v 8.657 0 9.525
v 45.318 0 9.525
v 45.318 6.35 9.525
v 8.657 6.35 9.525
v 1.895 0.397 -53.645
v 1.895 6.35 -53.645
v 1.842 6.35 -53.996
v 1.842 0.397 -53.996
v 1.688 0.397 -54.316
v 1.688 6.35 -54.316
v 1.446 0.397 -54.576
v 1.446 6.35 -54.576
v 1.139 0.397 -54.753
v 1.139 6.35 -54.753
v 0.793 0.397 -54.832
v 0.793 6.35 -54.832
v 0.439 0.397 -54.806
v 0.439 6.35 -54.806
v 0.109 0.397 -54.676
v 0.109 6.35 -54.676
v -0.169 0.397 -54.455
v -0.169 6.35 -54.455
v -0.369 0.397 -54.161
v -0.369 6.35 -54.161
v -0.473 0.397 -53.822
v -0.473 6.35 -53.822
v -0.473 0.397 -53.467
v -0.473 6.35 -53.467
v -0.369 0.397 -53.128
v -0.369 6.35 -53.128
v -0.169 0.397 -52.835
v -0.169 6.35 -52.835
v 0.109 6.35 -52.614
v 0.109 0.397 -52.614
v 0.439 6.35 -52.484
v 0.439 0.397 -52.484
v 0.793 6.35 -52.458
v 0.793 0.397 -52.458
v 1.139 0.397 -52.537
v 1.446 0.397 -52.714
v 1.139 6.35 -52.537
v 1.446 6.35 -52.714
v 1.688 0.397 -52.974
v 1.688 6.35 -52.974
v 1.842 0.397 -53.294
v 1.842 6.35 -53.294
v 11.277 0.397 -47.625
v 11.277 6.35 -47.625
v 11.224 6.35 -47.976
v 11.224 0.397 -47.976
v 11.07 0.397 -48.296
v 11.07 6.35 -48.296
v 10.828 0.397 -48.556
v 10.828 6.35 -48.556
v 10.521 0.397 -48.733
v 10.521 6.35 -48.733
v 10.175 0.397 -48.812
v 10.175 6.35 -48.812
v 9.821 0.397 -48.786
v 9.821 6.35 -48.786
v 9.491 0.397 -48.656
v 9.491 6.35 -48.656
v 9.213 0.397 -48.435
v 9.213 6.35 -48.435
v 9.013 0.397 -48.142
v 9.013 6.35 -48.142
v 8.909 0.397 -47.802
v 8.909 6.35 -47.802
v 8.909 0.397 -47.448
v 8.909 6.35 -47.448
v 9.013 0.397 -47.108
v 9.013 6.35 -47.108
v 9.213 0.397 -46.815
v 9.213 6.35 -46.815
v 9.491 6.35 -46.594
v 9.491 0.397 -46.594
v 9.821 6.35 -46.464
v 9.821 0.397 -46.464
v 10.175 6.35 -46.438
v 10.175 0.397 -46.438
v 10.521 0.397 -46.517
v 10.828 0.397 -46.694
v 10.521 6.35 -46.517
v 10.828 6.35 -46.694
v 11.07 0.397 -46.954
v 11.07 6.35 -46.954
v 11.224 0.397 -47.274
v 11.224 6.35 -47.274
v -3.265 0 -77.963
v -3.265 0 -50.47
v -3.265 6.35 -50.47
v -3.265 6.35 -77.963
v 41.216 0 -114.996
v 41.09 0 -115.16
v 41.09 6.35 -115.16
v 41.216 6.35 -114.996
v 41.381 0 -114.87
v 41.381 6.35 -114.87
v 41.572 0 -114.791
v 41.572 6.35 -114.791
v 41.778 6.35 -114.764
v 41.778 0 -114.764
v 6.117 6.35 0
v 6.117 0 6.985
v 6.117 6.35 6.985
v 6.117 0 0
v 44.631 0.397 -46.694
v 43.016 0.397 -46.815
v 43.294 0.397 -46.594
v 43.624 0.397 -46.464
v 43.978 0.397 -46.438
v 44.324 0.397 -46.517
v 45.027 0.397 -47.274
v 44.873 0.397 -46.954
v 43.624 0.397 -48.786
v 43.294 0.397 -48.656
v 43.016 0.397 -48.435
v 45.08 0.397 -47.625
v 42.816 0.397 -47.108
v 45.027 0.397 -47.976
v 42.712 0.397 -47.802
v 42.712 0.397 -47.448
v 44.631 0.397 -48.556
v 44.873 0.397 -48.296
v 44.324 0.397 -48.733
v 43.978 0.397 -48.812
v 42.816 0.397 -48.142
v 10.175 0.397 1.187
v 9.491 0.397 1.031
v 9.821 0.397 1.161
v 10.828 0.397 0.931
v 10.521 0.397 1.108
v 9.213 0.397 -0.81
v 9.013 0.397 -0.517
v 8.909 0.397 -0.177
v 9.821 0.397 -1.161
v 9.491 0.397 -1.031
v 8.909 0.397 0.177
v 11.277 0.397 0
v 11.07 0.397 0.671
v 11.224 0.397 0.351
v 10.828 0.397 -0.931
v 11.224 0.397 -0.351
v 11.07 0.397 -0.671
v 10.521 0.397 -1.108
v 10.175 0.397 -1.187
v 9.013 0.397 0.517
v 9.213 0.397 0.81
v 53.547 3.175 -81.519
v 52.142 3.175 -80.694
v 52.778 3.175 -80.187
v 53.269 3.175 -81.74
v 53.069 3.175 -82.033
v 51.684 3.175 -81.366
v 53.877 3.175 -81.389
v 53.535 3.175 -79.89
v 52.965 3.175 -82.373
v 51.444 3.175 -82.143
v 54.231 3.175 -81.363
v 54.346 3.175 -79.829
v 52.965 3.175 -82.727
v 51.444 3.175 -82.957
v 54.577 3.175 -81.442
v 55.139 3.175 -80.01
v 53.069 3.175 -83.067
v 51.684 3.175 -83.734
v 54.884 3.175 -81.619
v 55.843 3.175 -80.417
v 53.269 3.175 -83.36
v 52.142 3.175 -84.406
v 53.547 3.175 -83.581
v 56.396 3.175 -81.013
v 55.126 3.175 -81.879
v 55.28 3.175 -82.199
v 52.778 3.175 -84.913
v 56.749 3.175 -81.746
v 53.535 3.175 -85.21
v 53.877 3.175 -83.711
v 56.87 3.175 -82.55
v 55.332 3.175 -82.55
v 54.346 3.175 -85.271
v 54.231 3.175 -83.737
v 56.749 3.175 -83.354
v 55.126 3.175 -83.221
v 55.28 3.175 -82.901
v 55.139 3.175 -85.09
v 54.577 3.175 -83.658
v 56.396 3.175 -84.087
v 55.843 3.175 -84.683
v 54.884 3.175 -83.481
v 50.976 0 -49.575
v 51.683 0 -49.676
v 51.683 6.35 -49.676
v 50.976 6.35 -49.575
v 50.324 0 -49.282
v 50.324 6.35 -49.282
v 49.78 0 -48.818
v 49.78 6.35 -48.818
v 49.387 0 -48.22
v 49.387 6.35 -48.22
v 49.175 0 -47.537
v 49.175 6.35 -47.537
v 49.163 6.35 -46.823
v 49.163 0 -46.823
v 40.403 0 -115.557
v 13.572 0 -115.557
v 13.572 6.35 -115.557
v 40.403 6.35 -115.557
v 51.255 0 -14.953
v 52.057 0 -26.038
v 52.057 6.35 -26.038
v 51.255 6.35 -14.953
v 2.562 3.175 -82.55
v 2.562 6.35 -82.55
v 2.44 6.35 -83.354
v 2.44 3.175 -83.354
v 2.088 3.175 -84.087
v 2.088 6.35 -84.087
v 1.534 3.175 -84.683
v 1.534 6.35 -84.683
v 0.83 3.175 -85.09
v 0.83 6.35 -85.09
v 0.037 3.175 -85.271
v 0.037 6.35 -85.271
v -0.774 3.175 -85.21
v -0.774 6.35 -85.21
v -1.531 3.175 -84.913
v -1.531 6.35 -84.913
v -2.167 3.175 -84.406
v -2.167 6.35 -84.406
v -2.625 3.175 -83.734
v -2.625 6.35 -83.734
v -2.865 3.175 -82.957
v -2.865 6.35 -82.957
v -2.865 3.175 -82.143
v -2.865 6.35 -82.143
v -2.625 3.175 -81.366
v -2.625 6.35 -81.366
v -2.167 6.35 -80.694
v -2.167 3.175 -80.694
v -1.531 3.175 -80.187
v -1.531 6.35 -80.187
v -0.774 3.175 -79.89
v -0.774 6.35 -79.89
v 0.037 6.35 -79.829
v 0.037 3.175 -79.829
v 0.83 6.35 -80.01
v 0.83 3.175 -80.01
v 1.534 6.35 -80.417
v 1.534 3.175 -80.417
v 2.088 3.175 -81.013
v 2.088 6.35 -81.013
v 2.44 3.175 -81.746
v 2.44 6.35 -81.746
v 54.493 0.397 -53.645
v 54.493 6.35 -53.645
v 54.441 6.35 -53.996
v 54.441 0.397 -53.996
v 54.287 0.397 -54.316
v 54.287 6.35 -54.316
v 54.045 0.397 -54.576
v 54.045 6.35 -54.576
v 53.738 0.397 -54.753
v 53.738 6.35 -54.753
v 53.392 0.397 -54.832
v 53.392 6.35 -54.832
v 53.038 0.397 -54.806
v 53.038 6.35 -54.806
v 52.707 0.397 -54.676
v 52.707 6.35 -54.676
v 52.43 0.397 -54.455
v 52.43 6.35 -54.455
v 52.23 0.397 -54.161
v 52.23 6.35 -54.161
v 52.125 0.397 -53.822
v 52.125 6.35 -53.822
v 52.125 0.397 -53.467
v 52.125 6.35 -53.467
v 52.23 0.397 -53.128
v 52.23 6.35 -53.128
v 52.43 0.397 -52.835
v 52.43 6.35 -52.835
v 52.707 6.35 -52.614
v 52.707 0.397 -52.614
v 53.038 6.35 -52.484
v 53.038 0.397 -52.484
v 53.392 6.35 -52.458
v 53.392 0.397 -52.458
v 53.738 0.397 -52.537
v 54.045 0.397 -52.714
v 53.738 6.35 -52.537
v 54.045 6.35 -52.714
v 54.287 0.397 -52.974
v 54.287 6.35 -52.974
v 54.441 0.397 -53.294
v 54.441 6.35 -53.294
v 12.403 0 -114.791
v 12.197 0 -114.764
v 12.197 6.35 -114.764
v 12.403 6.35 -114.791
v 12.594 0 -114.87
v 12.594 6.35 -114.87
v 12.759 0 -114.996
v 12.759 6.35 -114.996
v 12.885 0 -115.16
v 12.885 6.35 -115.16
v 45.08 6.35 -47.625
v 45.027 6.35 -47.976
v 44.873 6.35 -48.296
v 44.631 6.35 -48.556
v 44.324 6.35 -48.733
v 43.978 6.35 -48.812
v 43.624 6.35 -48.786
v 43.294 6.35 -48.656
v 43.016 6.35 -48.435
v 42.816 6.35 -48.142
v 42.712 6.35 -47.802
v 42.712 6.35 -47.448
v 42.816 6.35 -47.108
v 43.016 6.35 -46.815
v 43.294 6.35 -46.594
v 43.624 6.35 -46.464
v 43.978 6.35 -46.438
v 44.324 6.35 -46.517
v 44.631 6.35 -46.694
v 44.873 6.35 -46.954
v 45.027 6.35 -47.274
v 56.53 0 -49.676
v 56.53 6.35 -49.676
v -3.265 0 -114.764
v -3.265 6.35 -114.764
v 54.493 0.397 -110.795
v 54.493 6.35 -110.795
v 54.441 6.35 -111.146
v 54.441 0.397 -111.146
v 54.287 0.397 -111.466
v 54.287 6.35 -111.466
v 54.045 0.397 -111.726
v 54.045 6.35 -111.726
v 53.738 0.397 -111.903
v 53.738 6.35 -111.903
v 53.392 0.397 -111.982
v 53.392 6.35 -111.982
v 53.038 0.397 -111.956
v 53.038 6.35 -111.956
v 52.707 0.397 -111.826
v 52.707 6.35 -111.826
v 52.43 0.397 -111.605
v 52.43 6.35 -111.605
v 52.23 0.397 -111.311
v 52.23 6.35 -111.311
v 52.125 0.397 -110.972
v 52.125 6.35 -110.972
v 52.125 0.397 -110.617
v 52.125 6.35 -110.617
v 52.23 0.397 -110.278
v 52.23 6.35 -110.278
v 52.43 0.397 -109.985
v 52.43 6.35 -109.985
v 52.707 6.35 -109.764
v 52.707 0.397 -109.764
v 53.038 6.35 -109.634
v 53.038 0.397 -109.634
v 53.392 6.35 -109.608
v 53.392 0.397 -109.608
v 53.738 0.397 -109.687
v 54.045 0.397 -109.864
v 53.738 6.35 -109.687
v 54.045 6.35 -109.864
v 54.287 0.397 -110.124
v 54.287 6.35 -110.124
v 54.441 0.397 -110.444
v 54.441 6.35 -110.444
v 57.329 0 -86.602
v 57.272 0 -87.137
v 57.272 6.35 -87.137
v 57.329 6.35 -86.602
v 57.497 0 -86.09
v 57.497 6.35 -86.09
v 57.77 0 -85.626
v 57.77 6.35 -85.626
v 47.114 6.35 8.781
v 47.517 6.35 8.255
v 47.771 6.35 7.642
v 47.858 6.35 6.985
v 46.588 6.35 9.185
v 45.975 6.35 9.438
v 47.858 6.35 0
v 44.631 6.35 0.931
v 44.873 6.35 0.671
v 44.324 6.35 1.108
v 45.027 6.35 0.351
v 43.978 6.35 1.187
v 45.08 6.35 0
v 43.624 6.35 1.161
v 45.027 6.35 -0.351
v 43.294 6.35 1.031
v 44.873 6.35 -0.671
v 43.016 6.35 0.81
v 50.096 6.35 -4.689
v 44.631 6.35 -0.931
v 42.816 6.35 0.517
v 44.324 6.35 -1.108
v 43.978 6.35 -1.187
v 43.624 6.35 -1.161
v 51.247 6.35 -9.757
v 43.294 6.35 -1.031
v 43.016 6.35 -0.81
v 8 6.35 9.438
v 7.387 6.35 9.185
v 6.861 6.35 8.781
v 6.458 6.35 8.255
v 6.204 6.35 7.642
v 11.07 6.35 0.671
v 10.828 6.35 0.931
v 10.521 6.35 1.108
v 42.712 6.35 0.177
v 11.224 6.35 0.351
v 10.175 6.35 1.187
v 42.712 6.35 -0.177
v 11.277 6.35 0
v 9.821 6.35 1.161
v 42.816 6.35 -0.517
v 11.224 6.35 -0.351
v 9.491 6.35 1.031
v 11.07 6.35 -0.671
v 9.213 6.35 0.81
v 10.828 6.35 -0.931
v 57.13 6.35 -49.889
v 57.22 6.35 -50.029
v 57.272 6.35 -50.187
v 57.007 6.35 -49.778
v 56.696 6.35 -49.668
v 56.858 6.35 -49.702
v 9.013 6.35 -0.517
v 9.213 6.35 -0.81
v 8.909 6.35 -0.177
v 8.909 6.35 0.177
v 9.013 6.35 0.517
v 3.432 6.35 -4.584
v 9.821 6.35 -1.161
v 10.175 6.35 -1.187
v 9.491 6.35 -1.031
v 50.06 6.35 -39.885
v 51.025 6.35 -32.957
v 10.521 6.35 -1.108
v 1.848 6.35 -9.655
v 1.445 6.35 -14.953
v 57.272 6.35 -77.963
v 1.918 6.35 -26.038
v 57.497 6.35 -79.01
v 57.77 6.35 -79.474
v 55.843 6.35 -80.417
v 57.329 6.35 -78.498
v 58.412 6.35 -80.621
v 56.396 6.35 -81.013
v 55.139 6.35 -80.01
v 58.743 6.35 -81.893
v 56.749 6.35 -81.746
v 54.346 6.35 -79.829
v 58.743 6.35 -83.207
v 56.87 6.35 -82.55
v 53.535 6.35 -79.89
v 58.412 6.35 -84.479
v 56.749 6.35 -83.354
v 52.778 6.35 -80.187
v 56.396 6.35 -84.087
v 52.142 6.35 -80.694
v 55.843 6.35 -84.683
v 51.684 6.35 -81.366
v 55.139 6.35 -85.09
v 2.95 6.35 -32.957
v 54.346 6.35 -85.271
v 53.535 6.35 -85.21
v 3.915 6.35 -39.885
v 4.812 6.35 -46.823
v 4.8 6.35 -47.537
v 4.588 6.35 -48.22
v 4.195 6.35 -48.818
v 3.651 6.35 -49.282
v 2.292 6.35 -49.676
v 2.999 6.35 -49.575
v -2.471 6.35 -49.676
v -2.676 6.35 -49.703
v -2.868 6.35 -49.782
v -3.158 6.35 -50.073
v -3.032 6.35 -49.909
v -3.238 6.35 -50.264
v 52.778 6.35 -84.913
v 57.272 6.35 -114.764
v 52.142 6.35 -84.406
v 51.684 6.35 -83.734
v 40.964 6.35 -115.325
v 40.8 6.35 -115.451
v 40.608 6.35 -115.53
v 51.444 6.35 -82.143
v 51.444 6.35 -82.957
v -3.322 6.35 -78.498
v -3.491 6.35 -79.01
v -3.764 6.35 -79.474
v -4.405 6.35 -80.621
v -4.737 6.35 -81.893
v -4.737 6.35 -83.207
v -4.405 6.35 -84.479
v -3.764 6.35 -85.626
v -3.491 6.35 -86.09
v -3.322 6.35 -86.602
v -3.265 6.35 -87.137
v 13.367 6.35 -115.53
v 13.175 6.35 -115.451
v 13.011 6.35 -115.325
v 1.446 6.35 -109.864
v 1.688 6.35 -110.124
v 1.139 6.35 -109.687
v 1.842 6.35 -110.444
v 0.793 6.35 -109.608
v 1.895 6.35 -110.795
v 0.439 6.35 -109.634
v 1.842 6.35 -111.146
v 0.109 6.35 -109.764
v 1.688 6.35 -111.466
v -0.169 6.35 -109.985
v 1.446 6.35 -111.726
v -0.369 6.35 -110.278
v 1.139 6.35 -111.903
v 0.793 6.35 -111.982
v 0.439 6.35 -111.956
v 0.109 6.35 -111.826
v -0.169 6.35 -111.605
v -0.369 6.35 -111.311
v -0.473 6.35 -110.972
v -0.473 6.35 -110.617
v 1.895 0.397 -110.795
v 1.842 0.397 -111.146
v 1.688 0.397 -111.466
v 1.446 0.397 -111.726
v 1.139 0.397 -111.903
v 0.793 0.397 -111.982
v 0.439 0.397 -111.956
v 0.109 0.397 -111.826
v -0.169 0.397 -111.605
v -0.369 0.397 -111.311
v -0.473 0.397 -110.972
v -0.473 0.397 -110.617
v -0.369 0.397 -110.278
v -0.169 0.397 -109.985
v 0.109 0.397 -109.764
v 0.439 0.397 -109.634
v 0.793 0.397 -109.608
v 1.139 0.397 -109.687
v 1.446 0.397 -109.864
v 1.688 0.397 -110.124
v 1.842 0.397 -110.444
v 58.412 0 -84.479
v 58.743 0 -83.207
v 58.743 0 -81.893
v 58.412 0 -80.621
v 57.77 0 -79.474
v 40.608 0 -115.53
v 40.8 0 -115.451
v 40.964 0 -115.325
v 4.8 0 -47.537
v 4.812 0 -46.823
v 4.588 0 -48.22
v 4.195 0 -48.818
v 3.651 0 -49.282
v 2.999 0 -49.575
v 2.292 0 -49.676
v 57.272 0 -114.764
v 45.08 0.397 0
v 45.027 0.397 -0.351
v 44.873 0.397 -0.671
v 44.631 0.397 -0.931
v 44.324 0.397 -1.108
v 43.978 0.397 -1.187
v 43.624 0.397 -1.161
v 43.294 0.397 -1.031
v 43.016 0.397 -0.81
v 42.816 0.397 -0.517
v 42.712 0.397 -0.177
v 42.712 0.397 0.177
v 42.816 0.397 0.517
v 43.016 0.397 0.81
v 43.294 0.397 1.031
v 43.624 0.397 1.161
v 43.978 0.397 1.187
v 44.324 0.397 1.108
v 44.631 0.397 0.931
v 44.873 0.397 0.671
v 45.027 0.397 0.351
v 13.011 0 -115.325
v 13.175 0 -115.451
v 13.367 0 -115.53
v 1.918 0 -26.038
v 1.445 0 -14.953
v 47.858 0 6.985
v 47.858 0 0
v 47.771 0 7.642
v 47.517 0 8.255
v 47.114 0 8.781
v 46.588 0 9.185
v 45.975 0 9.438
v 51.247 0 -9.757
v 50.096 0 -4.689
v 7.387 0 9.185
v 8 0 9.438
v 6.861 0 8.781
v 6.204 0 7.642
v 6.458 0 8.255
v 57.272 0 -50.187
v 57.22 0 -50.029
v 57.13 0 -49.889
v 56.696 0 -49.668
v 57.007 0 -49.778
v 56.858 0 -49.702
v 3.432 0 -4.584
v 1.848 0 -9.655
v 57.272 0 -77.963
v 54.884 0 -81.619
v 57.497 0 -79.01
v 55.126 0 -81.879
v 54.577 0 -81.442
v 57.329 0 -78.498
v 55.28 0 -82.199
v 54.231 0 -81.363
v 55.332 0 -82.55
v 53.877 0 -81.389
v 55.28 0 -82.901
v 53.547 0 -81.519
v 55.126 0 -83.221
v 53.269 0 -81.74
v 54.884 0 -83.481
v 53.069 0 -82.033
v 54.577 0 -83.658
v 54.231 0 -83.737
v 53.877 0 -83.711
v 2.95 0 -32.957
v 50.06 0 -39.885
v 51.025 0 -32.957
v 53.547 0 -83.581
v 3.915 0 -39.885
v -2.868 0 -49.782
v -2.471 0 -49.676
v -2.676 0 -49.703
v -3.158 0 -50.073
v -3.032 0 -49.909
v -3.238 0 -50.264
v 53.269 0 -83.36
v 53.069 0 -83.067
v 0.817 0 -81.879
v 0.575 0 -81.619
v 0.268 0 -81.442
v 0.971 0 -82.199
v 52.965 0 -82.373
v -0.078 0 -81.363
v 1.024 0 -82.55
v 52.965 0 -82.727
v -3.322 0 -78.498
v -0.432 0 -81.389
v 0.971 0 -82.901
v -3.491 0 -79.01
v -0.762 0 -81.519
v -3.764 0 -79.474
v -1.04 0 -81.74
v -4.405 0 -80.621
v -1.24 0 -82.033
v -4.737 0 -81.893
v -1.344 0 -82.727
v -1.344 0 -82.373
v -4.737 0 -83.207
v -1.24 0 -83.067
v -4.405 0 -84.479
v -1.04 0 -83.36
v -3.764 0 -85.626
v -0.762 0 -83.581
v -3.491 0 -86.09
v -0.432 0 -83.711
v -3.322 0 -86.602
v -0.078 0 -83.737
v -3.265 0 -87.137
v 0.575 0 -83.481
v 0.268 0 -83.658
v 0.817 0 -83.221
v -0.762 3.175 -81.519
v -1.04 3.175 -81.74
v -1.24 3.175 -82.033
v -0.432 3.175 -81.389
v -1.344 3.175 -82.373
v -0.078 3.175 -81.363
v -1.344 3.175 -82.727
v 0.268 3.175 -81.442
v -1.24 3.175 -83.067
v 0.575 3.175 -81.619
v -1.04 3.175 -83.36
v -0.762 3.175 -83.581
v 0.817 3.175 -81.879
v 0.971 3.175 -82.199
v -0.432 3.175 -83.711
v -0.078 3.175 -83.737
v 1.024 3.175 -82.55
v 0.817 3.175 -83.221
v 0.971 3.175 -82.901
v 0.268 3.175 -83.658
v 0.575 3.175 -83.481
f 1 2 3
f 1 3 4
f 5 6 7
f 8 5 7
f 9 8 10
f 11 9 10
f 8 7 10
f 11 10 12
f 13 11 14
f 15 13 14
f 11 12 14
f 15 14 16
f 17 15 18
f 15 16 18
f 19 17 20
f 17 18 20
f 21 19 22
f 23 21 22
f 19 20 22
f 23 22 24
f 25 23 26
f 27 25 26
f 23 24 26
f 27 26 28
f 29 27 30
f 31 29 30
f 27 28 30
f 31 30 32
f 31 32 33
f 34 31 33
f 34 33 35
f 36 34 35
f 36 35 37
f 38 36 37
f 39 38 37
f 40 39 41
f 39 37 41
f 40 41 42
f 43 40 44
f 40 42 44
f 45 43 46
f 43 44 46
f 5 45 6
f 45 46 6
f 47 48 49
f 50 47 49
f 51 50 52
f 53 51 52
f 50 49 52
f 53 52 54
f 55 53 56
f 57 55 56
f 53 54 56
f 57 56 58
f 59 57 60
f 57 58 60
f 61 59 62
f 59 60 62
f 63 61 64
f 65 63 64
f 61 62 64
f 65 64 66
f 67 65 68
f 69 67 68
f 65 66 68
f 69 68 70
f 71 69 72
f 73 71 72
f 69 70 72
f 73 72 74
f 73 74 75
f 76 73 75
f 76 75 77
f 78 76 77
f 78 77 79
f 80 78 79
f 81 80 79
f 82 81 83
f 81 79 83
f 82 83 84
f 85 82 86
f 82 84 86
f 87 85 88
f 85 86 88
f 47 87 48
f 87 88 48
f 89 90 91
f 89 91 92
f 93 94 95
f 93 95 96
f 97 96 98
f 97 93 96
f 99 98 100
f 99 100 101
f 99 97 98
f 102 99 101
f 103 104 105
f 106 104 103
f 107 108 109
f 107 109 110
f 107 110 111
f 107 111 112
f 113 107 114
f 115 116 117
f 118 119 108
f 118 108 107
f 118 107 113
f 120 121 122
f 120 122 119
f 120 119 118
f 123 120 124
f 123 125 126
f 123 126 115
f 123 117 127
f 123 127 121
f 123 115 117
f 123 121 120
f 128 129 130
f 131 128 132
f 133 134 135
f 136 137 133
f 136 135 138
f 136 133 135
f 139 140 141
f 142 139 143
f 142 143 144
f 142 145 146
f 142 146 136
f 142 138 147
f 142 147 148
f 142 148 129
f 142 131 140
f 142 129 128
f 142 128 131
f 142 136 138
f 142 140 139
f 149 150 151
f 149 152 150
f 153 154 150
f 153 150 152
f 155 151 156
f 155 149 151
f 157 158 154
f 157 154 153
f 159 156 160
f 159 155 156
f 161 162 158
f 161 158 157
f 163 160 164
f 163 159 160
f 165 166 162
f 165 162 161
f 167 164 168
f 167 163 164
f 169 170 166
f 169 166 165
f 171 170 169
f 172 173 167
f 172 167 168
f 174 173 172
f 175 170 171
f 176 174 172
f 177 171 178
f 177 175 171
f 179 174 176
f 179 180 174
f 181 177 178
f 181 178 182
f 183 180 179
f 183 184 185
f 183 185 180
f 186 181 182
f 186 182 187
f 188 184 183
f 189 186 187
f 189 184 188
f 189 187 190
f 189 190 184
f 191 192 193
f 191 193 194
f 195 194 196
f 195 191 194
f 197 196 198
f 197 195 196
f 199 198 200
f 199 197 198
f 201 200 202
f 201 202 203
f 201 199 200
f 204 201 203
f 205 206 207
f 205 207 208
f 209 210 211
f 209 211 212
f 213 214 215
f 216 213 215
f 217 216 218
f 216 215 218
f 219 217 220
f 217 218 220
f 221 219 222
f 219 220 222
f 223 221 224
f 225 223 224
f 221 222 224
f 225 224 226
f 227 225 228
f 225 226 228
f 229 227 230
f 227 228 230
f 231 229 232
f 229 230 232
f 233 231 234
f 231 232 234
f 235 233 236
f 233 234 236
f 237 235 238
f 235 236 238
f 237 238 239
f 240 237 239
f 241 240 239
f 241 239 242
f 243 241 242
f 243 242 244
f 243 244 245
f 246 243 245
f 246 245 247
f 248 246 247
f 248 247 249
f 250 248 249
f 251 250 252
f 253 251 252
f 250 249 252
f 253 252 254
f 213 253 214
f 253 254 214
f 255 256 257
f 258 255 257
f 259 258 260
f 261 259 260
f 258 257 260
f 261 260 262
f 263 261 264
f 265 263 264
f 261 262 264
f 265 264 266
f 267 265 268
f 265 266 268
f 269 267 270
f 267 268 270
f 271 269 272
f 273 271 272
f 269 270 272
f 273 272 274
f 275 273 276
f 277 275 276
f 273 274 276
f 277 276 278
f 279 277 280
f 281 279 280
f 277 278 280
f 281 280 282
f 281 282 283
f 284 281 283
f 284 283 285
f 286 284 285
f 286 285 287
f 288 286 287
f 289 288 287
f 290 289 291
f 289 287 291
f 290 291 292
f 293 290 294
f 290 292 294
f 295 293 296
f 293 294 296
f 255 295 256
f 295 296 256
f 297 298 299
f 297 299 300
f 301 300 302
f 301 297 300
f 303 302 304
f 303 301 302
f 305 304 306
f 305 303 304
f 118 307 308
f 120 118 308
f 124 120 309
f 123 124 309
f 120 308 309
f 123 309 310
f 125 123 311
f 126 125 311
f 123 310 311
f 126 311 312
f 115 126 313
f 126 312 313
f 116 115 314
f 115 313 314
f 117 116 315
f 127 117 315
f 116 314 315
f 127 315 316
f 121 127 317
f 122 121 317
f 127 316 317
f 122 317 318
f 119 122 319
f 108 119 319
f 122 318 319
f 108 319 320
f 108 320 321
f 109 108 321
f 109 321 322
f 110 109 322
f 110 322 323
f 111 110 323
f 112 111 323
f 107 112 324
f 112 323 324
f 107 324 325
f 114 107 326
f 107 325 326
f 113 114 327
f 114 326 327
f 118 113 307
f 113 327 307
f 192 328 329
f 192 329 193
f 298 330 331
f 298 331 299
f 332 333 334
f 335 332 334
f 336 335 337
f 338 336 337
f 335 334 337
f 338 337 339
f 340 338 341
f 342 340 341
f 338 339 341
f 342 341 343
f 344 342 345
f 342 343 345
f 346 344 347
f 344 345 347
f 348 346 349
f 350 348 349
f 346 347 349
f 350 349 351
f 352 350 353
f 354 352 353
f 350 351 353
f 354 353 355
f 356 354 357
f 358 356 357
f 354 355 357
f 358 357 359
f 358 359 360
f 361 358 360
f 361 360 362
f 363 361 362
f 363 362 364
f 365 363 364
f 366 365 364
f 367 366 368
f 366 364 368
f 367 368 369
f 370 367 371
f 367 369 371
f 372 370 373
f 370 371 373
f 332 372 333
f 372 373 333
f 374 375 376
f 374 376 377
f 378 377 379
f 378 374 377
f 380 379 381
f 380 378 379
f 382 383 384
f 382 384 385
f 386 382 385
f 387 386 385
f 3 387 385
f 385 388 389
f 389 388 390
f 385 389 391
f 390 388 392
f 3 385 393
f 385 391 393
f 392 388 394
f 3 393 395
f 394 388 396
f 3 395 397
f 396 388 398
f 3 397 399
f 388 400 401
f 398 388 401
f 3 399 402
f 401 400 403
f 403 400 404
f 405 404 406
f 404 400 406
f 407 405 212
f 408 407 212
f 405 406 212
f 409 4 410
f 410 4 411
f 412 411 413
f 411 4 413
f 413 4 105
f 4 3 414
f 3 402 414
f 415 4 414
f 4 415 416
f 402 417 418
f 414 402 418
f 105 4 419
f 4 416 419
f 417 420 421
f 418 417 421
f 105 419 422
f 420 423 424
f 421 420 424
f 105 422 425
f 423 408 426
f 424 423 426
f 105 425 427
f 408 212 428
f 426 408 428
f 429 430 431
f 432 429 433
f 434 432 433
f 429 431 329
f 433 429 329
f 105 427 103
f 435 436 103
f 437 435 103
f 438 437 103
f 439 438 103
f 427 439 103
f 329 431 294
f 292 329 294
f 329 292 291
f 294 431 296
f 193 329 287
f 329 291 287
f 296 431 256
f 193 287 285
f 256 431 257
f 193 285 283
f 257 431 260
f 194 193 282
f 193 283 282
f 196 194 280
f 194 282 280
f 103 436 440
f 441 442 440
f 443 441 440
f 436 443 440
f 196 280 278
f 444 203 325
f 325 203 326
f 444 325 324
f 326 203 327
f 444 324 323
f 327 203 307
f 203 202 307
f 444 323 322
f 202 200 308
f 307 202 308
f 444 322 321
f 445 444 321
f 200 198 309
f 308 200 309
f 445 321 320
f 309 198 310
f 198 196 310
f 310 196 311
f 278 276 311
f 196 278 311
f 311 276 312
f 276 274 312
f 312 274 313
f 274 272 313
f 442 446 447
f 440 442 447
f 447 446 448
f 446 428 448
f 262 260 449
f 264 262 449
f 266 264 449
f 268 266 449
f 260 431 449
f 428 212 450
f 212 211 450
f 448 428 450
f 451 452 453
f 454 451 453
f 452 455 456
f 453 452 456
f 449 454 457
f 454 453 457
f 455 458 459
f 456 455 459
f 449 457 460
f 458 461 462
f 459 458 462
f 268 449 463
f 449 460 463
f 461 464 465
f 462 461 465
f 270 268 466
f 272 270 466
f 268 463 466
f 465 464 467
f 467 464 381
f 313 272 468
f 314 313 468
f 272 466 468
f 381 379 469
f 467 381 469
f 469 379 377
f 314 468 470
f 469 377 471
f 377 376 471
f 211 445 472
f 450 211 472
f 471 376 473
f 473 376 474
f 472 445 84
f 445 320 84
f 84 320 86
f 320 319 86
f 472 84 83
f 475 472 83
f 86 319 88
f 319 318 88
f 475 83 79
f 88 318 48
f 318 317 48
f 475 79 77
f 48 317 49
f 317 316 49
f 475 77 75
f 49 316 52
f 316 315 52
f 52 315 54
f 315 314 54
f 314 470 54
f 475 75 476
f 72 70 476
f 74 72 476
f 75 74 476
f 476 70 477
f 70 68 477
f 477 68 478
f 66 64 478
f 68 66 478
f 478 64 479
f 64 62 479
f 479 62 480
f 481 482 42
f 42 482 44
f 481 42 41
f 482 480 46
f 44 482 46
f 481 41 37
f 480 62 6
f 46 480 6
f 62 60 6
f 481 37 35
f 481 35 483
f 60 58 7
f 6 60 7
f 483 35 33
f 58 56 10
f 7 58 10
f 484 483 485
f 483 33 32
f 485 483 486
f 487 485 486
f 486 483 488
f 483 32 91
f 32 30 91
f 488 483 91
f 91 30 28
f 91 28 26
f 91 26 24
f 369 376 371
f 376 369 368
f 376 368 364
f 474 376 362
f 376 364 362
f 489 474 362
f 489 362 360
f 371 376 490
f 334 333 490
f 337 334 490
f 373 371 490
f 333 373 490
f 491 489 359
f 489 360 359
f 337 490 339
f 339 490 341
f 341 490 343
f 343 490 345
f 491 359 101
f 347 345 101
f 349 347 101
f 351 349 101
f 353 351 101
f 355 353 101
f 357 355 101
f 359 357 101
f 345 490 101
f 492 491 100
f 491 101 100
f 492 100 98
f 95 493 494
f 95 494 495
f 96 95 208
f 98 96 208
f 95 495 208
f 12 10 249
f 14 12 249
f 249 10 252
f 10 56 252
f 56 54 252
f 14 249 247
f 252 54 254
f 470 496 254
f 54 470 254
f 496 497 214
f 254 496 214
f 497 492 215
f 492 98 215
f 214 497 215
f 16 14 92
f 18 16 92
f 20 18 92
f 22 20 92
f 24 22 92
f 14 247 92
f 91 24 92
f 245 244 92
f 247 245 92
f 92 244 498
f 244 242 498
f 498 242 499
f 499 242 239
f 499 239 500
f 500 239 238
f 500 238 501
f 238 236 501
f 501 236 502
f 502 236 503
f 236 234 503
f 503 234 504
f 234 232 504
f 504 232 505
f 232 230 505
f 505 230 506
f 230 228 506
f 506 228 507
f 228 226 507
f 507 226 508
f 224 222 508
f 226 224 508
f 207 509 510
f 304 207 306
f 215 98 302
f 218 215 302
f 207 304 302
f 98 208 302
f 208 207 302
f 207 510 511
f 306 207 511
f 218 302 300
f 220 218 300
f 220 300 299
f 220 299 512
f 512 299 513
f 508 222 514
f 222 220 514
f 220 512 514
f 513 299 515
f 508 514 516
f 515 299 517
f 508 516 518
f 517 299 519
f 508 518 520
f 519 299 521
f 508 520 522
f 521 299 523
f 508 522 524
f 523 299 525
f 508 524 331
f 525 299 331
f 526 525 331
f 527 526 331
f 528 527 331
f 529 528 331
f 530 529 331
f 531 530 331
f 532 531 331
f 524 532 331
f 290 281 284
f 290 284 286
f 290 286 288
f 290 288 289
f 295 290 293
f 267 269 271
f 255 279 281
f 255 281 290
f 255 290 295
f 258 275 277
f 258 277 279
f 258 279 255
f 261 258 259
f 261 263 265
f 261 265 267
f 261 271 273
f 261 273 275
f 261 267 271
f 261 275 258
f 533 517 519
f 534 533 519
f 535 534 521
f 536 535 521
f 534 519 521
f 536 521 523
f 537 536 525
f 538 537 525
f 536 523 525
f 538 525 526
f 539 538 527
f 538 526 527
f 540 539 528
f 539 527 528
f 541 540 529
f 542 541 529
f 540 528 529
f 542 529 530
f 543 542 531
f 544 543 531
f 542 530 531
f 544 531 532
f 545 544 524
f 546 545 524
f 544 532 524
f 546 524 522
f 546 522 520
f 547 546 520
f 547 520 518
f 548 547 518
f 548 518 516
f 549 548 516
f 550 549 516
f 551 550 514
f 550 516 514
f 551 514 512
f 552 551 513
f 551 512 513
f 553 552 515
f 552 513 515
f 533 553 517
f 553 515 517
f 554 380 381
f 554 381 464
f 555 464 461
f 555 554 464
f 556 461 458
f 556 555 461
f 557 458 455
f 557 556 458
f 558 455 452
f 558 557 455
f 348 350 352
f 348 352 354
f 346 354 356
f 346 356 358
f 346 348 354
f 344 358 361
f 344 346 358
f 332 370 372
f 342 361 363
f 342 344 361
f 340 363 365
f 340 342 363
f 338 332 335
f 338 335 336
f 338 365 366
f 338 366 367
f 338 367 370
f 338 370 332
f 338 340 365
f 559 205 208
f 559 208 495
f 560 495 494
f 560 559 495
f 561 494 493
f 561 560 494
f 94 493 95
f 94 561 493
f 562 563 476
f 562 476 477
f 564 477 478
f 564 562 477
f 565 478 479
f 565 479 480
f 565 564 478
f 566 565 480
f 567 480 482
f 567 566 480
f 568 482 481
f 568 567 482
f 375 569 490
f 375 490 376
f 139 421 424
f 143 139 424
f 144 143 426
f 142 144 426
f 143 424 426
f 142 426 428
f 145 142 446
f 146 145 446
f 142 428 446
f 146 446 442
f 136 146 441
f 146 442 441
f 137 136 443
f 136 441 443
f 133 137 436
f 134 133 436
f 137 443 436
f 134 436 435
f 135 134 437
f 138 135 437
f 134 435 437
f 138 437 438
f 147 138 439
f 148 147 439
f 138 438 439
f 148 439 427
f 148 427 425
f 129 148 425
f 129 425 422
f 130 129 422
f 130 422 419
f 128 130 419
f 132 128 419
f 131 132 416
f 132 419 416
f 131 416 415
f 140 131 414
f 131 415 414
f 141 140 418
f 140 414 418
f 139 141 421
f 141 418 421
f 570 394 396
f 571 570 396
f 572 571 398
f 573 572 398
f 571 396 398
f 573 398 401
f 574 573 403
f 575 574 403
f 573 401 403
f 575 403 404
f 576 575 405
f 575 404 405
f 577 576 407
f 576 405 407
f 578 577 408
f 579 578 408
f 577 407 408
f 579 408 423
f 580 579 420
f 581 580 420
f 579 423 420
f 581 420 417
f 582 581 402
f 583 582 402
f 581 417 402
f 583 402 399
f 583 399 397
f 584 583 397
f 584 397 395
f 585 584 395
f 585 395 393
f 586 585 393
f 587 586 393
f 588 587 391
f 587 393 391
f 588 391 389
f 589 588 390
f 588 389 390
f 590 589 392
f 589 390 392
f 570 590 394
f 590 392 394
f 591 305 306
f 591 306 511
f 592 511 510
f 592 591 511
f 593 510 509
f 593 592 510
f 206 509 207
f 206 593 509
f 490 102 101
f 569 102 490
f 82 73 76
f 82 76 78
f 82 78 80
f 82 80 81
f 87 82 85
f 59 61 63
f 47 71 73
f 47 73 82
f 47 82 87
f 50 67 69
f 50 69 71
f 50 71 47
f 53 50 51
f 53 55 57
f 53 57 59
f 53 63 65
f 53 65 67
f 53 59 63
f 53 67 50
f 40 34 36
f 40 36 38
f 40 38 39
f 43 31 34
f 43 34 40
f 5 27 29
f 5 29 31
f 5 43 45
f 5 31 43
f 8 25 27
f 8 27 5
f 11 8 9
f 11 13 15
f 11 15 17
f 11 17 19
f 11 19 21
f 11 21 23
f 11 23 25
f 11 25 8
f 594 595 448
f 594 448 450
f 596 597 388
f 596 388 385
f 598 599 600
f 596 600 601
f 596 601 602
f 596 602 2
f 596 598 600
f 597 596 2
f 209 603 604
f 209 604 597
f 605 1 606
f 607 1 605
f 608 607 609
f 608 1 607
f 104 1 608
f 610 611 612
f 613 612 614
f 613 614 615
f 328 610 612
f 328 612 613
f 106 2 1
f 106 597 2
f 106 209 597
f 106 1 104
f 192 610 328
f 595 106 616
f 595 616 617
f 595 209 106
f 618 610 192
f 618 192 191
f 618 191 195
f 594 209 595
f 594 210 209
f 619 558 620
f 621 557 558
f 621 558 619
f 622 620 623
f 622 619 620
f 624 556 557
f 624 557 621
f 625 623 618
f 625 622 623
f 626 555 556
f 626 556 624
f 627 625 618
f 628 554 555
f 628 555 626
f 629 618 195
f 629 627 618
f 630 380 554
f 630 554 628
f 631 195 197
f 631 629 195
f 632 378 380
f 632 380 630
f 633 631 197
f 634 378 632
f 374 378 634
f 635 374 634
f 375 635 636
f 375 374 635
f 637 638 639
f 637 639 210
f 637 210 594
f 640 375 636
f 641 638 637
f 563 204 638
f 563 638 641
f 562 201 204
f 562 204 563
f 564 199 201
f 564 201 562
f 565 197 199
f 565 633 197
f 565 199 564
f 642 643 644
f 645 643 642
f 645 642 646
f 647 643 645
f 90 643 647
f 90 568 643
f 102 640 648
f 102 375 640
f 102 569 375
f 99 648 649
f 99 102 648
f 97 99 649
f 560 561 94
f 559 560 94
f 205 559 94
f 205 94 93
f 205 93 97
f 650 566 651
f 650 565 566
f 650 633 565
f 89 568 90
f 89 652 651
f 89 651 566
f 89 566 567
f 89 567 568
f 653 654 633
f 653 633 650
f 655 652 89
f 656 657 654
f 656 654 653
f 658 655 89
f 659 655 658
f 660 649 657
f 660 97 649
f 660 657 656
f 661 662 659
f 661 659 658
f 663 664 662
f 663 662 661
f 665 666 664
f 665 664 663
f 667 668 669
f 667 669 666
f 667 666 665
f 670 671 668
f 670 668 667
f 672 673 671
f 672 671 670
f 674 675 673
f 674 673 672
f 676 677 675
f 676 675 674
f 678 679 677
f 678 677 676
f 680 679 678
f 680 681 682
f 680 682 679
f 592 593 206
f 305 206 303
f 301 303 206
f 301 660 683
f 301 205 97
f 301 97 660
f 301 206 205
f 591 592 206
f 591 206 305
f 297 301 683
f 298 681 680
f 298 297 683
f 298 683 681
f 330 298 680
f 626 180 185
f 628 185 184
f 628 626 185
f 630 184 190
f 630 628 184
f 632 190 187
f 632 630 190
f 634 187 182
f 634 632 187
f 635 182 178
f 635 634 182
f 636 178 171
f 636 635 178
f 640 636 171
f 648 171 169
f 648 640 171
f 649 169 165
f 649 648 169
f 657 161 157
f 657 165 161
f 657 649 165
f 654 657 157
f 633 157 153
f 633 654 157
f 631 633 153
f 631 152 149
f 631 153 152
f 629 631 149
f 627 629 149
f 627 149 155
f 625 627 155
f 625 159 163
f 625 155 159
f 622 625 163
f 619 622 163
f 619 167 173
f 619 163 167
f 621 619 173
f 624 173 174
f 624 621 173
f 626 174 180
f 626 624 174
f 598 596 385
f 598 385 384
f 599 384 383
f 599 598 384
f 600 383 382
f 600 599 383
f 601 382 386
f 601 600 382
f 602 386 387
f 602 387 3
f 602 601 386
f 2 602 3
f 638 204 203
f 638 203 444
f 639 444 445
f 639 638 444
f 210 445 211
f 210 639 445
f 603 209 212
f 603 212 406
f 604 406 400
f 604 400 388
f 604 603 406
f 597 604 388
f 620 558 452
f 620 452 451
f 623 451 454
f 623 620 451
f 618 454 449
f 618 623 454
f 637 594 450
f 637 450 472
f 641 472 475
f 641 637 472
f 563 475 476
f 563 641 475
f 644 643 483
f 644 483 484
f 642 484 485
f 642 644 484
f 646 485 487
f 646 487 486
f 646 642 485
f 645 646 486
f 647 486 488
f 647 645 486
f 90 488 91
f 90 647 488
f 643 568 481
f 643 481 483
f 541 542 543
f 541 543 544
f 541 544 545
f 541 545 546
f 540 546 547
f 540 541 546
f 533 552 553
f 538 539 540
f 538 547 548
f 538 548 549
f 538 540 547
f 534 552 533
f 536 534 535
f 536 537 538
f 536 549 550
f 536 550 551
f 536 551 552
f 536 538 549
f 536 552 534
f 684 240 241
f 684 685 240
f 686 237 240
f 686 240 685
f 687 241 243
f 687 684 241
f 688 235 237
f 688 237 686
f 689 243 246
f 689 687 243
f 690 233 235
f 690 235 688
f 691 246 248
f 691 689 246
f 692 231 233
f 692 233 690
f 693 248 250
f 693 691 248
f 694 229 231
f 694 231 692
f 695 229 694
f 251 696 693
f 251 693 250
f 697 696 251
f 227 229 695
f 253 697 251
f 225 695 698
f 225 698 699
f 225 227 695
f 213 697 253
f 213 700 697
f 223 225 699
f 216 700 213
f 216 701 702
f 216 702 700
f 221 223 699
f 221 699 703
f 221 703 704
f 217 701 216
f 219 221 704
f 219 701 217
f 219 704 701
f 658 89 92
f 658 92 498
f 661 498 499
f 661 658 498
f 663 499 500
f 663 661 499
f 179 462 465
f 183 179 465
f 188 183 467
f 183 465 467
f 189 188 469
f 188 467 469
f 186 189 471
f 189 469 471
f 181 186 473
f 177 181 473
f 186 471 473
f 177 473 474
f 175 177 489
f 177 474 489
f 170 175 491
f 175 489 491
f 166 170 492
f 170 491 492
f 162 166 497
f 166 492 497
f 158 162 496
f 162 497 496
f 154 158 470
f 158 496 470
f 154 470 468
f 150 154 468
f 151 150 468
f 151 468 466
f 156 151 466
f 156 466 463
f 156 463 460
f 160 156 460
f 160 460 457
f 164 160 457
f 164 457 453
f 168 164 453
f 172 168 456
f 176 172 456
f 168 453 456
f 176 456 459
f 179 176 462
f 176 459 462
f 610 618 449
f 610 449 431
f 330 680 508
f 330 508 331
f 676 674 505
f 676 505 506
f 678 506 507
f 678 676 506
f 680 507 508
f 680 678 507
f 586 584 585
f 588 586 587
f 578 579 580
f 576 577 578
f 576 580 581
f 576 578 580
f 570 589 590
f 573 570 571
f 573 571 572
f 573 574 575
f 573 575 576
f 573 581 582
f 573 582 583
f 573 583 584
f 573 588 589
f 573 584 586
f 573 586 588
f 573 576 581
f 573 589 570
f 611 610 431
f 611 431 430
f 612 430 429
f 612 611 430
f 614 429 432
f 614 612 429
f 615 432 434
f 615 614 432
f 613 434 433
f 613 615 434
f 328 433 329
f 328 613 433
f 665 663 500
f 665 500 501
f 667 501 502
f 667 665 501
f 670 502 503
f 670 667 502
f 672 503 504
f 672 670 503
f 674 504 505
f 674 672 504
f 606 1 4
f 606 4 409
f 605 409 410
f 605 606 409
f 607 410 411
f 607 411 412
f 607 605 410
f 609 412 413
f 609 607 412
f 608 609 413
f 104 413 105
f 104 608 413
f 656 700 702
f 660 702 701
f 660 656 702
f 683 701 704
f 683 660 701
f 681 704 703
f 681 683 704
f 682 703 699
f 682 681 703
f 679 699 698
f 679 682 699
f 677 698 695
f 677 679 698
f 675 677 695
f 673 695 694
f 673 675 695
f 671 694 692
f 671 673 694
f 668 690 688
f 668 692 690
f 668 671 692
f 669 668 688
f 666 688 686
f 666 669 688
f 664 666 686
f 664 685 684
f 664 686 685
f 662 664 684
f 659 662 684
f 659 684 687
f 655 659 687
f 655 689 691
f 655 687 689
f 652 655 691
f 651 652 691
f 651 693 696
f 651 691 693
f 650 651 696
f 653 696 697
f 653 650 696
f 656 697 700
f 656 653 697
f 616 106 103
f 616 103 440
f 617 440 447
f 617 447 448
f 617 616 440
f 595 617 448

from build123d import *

# Parameters (mm, degrees)
SKETCH1_R           = 1.190625
BOSS_EXTRUDE1_DEPTH = 6.35
SKETCH2_R           = 1.190625
CUT_EXTRUDE1_DEPTH  = 5.953125
SKETCH3_R           = 2.728515752
CUT_EXTRUDE2_DEPTH  = 3.175


with BuildPart() as part:
    # Sketch1 → Boss-Extrude1 (new body)
    with BuildSketch(Plane(origin=(0, 0, 0), x_dir=(1, 0, 0), z_dir=(0, 1, 0))):
        with BuildLine():
            ThreePointArc((57.271558663, 87.137426409), (57.399480252, 86.341513261), (57.770360032, 85.625768991))
            ThreePointArc((57.770360032, 85.625768991), (58.78527106, 82.55), (57.770360032, 79.474231009))
            ThreePointArc((57.770360032, 79.474231009), (57.399480252, 78.758486739), (57.271558663, 77.962573591))
            Line((57.271558663, 77.962573591), (57.271558663, 50.187158197))
            ThreePointArc((57.271558663, 50.187158197), (57.006550783, 49.778004586), (56.529846621, 49.676078162))
            Line((56.529846621, 49.676078162), (52.561739328, 49.676078162))
            Line((52.561739328, 49.676078162), (51.683486492, 49.676078162))
            ThreePointArc((51.683486492, 49.676078162), (49.779800182, 48.817618657), (49.162915139, 46.822517874))
            ThreePointArc((49.162915139, 46.822517874), (50.534142833, 36.419600029), (52.056928392, 26.037784715))
            Line((52.056928392, 26.037784715), (51.254736023, 14.952744828))
            ThreePointArc((51.254736023, 14.952744828), (50.812383961, 7.190984278), (47.857667851, 0))
            Line((47.857667851, 0), (47.857667851, -6.985))
            ThreePointArc((47.857667851, -6.985), (47.113719075, -8.781051224), (45.317667851, -9.525))
            Line((45.317667851, -9.525), (8.657332149, -9.525))
            ThreePointArc((8.657332149, -9.525), (6.861280925, -8.781051224), (6.117332149, -6.985))
            Line((6.117332149, -6.985), (6.117332149, 0))
            ThreePointArc((6.117332149, 0), (2.495961134, 7.074805948), (1.444635194, 14.952744828))
            Line((1.444635194, 14.952744828), (1.918071608, 26.037784715))
            ThreePointArc((1.918071608, 26.037784715), (3.440857167, 36.419600029), (4.812084861, 46.822517874))
            ThreePointArc((4.812084861, 46.822517874), (4.195199818, 48.817618657), (2.291513508, 49.676078162))
            Line((2.291513508, 49.676078162), (-2.470986492, 49.676078162))
            ThreePointArc((-2.470986492, 49.676078162), (-3.032252499, 49.908562155), (-3.264736492, 50.469828162))
            Line((-3.264736492, 50.469828162), (-3.264736492, 77.962573591))
            ThreePointArc((-3.264736492, 77.962573591), (-3.392658081, 78.758486739), (-3.763537861, 79.474231009))
            ThreePointArc((-3.763537861, 79.474231009), (-4.778448889, 82.55), (-3.763537861, 85.625768991))
            ThreePointArc((-3.763537861, 85.625768991), (-3.392658081, 86.341513261), (-3.264736492, 87.137426409))
            Line((-3.264736492, 87.137426409), (-3.264736492, 114.763578162))
            Line((-3.264736492, 114.763578162), (12.197441337, 114.763578162))
            ThreePointArc((12.197441337, 114.763578162), (12.594316337, 114.869920498), (12.884849002, 115.160453162))
            ThreePointArc((12.884849002, 115.160453162), (13.175381666, 115.450985826), (13.572256666, 115.557328162))
            Line((13.572256666, 115.557328162), (40.402743334, 115.557328162))
            ThreePointArc((40.402743334, 115.557328162), (40.799618334, 115.450985826), (41.090150998, 115.160453162))
            ThreePointArc((41.090150998, 115.160453162), (41.380683663, 114.869920498), (41.777558663, 114.763578162))
            Line((41.777558663, 114.763578162), (57.271558663, 114.763578162))
            Line((57.271558663, 114.763578162), (57.271558663, 87.137426409))
        make_face()
        with Locations((54.141854512, 82.55)):
            Circle(SKETCH1_R, mode=Mode.SUBTRACT)
        with Locations((-0.166854512, 82.55)):
            Circle(SKETCH1_R, mode=Mode.SUBTRACT)
    extrude(amount=BOSS_EXTRUDE1_DEPTH)

    # Sketch2 → Cut-Extrude1 (cut)
    with BuildSketch(Plane(origin=(0, 6.35, 0), x_dir=(1, 0, 0), z_dir=(0, 1, 0))):
        with Locations((10.086082149, 0)):
            Circle(SKETCH2_R)
        with Locations((43.888917851, 0)):
            Circle(SKETCH2_R)
        with Locations((10.086082149, 47.625)):
            Circle(SKETCH2_R)
        with Locations((43.888917851, 47.625)):
            Circle(SKETCH2_R)
        with Locations((0.704013508, 53.644828162)):
            Circle(SKETCH2_R)
        with Locations((0.704013508, 110.794828162)):
            Circle(SKETCH2_R)
        with Locations((53.302808663, 53.644828162)):
            Circle(SKETCH2_R)
        with Locations((53.302808663, 110.794828162)):
            Circle(SKETCH2_R)
    extrude(amount=-CUT_EXTRUDE1_DEPTH, mode=Mode.SUBTRACT)

    # Sketch3 → Cut-Extrude2 (cut)
    with BuildSketch(Plane(origin=(0, 6.35, 0), x_dir=(1, 0, 0), z_dir=(0, 1, 0))):
        with Locations((-0.166854512, 82.55)):
            Circle(SKETCH3_R)
        with Locations((54.141854512, 82.55)):
            Circle(SKETCH3_R)
    extrude(amount=-CUT_EXTRUDE2_DEPTH, mode=Mode.SUBTRACT)


solid = part.part
